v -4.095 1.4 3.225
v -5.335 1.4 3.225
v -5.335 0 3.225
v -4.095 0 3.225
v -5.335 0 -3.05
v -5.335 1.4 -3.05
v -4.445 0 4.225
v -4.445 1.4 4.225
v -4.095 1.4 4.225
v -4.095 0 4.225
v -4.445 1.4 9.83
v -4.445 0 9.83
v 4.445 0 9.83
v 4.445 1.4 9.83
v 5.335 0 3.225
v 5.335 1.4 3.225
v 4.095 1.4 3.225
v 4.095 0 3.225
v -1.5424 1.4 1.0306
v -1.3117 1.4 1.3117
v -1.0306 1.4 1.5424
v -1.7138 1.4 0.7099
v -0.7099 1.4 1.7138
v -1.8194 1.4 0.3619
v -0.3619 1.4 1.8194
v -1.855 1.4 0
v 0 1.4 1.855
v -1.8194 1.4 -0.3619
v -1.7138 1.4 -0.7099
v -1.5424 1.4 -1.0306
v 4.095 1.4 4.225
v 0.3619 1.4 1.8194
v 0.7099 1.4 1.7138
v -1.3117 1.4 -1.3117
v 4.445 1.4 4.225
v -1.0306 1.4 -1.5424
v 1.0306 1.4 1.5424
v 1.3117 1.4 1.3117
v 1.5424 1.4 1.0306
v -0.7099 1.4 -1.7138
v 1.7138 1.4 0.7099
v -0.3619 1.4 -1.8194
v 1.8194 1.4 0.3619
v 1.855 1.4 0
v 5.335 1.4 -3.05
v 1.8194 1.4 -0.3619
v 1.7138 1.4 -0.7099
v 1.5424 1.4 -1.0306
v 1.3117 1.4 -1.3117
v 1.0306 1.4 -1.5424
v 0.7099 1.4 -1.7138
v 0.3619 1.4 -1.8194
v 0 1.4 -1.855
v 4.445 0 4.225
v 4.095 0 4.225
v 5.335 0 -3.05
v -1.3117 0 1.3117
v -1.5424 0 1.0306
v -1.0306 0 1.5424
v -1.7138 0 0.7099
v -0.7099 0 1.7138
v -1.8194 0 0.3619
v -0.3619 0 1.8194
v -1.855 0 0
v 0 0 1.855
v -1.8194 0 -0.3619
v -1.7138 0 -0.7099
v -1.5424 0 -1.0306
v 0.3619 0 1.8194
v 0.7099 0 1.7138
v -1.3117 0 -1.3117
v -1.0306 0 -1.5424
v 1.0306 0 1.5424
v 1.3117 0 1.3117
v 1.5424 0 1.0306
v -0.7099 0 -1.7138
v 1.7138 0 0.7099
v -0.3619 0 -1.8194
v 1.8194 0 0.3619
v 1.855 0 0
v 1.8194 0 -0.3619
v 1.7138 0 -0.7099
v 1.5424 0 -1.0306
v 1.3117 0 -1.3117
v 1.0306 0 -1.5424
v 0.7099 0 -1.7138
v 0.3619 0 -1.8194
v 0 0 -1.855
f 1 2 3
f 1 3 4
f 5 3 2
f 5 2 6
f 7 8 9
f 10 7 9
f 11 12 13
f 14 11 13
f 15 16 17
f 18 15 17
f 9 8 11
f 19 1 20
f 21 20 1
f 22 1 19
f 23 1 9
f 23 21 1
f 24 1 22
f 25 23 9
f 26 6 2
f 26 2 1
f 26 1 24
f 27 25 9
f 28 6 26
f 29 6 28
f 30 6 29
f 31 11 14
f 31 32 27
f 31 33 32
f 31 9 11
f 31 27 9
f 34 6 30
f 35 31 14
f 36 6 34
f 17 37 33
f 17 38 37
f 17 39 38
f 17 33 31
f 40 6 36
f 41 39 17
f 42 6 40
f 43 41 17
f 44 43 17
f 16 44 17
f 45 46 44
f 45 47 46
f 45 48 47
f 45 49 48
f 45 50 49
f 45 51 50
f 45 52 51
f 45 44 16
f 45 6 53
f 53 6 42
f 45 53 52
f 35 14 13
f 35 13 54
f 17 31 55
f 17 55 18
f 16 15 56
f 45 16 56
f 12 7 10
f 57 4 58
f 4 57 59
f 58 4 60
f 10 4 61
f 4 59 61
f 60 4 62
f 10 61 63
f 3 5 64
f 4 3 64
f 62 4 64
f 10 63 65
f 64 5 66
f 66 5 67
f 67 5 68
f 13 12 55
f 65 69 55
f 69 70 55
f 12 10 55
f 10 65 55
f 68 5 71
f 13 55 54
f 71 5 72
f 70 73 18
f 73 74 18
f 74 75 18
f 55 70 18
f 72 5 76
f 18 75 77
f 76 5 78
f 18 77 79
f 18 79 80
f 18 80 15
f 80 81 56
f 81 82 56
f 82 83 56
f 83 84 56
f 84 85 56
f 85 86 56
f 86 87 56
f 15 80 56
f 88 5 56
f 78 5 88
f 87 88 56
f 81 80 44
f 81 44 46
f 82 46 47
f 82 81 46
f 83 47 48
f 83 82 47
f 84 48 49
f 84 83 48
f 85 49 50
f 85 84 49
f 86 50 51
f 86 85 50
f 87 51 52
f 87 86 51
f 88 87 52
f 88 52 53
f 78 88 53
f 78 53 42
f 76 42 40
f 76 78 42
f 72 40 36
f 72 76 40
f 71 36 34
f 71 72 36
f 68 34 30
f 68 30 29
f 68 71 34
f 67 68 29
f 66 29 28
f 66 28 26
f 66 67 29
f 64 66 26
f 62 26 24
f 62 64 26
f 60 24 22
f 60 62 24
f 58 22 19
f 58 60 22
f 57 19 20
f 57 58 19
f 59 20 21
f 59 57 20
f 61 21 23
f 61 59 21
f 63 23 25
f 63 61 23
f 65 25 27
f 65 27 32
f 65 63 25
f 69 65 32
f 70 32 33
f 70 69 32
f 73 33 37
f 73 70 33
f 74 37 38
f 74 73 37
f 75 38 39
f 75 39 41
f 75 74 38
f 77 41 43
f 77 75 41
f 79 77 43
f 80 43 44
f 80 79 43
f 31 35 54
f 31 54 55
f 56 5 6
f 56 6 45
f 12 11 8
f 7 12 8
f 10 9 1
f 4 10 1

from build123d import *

# Parameters (mm, degrees)
SKETCH1_W           = 10.67
SKETCH1_H           = 12.88
SKETCH1_R           = 1.855
BOSS_EXTRUDE1_DEPTH = 1.4
SKETCH2_W           = 0.89
SKETCH2_H           = 6.605
CUT_EXTRUDE1_DEPTH  = 2.4
SKETCH3_W           = 0.35
SKETCH3_H           = 1
CUT_EXTRUDE2_DEPTH  = 2.4


with BuildPart() as part:
    # Sketch1 → Boss-Extrude1 (new body)
    with BuildSketch(Plane(origin=(0, 0, 0), x_dir=(1, 0, 0), z_dir=(0, 1, 0))):
        with Locations((0, -3.39)):
            Rectangle(SKETCH1_W, SKETCH1_H)
        Circle(SKETCH1_R, mode=Mode.SUBTRACT)
    extrude(amount=BOSS_EXTRUDE1_DEPTH)

    # Sketch2 → Cut-Extrude1 (cut, through all)
    with BuildSketch(Plane(origin=(0, 1.4, 0), x_dir=(1, 0, 0), z_dir=(0, 1, 0))):
        with Locations((-4.89, -6.5275)):
            Rectangle(SKETCH2_W, SKETCH2_H)
    cut_extrude1 = extrude(amount=-CUT_EXTRUDE1_DEPTH, mode=Mode.SUBTRACT)

    # Mirror1: Cut-Extrude1 across plane
    add(cut_extrude1.mirror(Plane(origin=(0, 0, 0), x_dir=(0, 0, 1), z_dir=(1, 0, 0))), mode=Mode.SUBTRACT)

    # Sketch3 → Cut-Extrude2 (cut, through all)
    with BuildSketch(Plane(origin=(0, 1.4, 0), x_dir=(1, 0, 0), z_dir=(0, 1, 0))):
        with Locations((-4.27, -3.725)):
            Rectangle(SKETCH3_W, SKETCH3_H)
    cut_extrude2 = extrude(amount=-CUT_EXTRUDE2_DEPTH, mode=Mode.SUBTRACT)

    # Mirror2: Cut-Extrude2 across plane
    add(cut_extrude2.mirror(Plane(origin=(0, 0, 0), x_dir=(0, 0, 1), z_dir=(1, 0, 0))), mode=Mode.SUBTRACT)


solid = part.part
